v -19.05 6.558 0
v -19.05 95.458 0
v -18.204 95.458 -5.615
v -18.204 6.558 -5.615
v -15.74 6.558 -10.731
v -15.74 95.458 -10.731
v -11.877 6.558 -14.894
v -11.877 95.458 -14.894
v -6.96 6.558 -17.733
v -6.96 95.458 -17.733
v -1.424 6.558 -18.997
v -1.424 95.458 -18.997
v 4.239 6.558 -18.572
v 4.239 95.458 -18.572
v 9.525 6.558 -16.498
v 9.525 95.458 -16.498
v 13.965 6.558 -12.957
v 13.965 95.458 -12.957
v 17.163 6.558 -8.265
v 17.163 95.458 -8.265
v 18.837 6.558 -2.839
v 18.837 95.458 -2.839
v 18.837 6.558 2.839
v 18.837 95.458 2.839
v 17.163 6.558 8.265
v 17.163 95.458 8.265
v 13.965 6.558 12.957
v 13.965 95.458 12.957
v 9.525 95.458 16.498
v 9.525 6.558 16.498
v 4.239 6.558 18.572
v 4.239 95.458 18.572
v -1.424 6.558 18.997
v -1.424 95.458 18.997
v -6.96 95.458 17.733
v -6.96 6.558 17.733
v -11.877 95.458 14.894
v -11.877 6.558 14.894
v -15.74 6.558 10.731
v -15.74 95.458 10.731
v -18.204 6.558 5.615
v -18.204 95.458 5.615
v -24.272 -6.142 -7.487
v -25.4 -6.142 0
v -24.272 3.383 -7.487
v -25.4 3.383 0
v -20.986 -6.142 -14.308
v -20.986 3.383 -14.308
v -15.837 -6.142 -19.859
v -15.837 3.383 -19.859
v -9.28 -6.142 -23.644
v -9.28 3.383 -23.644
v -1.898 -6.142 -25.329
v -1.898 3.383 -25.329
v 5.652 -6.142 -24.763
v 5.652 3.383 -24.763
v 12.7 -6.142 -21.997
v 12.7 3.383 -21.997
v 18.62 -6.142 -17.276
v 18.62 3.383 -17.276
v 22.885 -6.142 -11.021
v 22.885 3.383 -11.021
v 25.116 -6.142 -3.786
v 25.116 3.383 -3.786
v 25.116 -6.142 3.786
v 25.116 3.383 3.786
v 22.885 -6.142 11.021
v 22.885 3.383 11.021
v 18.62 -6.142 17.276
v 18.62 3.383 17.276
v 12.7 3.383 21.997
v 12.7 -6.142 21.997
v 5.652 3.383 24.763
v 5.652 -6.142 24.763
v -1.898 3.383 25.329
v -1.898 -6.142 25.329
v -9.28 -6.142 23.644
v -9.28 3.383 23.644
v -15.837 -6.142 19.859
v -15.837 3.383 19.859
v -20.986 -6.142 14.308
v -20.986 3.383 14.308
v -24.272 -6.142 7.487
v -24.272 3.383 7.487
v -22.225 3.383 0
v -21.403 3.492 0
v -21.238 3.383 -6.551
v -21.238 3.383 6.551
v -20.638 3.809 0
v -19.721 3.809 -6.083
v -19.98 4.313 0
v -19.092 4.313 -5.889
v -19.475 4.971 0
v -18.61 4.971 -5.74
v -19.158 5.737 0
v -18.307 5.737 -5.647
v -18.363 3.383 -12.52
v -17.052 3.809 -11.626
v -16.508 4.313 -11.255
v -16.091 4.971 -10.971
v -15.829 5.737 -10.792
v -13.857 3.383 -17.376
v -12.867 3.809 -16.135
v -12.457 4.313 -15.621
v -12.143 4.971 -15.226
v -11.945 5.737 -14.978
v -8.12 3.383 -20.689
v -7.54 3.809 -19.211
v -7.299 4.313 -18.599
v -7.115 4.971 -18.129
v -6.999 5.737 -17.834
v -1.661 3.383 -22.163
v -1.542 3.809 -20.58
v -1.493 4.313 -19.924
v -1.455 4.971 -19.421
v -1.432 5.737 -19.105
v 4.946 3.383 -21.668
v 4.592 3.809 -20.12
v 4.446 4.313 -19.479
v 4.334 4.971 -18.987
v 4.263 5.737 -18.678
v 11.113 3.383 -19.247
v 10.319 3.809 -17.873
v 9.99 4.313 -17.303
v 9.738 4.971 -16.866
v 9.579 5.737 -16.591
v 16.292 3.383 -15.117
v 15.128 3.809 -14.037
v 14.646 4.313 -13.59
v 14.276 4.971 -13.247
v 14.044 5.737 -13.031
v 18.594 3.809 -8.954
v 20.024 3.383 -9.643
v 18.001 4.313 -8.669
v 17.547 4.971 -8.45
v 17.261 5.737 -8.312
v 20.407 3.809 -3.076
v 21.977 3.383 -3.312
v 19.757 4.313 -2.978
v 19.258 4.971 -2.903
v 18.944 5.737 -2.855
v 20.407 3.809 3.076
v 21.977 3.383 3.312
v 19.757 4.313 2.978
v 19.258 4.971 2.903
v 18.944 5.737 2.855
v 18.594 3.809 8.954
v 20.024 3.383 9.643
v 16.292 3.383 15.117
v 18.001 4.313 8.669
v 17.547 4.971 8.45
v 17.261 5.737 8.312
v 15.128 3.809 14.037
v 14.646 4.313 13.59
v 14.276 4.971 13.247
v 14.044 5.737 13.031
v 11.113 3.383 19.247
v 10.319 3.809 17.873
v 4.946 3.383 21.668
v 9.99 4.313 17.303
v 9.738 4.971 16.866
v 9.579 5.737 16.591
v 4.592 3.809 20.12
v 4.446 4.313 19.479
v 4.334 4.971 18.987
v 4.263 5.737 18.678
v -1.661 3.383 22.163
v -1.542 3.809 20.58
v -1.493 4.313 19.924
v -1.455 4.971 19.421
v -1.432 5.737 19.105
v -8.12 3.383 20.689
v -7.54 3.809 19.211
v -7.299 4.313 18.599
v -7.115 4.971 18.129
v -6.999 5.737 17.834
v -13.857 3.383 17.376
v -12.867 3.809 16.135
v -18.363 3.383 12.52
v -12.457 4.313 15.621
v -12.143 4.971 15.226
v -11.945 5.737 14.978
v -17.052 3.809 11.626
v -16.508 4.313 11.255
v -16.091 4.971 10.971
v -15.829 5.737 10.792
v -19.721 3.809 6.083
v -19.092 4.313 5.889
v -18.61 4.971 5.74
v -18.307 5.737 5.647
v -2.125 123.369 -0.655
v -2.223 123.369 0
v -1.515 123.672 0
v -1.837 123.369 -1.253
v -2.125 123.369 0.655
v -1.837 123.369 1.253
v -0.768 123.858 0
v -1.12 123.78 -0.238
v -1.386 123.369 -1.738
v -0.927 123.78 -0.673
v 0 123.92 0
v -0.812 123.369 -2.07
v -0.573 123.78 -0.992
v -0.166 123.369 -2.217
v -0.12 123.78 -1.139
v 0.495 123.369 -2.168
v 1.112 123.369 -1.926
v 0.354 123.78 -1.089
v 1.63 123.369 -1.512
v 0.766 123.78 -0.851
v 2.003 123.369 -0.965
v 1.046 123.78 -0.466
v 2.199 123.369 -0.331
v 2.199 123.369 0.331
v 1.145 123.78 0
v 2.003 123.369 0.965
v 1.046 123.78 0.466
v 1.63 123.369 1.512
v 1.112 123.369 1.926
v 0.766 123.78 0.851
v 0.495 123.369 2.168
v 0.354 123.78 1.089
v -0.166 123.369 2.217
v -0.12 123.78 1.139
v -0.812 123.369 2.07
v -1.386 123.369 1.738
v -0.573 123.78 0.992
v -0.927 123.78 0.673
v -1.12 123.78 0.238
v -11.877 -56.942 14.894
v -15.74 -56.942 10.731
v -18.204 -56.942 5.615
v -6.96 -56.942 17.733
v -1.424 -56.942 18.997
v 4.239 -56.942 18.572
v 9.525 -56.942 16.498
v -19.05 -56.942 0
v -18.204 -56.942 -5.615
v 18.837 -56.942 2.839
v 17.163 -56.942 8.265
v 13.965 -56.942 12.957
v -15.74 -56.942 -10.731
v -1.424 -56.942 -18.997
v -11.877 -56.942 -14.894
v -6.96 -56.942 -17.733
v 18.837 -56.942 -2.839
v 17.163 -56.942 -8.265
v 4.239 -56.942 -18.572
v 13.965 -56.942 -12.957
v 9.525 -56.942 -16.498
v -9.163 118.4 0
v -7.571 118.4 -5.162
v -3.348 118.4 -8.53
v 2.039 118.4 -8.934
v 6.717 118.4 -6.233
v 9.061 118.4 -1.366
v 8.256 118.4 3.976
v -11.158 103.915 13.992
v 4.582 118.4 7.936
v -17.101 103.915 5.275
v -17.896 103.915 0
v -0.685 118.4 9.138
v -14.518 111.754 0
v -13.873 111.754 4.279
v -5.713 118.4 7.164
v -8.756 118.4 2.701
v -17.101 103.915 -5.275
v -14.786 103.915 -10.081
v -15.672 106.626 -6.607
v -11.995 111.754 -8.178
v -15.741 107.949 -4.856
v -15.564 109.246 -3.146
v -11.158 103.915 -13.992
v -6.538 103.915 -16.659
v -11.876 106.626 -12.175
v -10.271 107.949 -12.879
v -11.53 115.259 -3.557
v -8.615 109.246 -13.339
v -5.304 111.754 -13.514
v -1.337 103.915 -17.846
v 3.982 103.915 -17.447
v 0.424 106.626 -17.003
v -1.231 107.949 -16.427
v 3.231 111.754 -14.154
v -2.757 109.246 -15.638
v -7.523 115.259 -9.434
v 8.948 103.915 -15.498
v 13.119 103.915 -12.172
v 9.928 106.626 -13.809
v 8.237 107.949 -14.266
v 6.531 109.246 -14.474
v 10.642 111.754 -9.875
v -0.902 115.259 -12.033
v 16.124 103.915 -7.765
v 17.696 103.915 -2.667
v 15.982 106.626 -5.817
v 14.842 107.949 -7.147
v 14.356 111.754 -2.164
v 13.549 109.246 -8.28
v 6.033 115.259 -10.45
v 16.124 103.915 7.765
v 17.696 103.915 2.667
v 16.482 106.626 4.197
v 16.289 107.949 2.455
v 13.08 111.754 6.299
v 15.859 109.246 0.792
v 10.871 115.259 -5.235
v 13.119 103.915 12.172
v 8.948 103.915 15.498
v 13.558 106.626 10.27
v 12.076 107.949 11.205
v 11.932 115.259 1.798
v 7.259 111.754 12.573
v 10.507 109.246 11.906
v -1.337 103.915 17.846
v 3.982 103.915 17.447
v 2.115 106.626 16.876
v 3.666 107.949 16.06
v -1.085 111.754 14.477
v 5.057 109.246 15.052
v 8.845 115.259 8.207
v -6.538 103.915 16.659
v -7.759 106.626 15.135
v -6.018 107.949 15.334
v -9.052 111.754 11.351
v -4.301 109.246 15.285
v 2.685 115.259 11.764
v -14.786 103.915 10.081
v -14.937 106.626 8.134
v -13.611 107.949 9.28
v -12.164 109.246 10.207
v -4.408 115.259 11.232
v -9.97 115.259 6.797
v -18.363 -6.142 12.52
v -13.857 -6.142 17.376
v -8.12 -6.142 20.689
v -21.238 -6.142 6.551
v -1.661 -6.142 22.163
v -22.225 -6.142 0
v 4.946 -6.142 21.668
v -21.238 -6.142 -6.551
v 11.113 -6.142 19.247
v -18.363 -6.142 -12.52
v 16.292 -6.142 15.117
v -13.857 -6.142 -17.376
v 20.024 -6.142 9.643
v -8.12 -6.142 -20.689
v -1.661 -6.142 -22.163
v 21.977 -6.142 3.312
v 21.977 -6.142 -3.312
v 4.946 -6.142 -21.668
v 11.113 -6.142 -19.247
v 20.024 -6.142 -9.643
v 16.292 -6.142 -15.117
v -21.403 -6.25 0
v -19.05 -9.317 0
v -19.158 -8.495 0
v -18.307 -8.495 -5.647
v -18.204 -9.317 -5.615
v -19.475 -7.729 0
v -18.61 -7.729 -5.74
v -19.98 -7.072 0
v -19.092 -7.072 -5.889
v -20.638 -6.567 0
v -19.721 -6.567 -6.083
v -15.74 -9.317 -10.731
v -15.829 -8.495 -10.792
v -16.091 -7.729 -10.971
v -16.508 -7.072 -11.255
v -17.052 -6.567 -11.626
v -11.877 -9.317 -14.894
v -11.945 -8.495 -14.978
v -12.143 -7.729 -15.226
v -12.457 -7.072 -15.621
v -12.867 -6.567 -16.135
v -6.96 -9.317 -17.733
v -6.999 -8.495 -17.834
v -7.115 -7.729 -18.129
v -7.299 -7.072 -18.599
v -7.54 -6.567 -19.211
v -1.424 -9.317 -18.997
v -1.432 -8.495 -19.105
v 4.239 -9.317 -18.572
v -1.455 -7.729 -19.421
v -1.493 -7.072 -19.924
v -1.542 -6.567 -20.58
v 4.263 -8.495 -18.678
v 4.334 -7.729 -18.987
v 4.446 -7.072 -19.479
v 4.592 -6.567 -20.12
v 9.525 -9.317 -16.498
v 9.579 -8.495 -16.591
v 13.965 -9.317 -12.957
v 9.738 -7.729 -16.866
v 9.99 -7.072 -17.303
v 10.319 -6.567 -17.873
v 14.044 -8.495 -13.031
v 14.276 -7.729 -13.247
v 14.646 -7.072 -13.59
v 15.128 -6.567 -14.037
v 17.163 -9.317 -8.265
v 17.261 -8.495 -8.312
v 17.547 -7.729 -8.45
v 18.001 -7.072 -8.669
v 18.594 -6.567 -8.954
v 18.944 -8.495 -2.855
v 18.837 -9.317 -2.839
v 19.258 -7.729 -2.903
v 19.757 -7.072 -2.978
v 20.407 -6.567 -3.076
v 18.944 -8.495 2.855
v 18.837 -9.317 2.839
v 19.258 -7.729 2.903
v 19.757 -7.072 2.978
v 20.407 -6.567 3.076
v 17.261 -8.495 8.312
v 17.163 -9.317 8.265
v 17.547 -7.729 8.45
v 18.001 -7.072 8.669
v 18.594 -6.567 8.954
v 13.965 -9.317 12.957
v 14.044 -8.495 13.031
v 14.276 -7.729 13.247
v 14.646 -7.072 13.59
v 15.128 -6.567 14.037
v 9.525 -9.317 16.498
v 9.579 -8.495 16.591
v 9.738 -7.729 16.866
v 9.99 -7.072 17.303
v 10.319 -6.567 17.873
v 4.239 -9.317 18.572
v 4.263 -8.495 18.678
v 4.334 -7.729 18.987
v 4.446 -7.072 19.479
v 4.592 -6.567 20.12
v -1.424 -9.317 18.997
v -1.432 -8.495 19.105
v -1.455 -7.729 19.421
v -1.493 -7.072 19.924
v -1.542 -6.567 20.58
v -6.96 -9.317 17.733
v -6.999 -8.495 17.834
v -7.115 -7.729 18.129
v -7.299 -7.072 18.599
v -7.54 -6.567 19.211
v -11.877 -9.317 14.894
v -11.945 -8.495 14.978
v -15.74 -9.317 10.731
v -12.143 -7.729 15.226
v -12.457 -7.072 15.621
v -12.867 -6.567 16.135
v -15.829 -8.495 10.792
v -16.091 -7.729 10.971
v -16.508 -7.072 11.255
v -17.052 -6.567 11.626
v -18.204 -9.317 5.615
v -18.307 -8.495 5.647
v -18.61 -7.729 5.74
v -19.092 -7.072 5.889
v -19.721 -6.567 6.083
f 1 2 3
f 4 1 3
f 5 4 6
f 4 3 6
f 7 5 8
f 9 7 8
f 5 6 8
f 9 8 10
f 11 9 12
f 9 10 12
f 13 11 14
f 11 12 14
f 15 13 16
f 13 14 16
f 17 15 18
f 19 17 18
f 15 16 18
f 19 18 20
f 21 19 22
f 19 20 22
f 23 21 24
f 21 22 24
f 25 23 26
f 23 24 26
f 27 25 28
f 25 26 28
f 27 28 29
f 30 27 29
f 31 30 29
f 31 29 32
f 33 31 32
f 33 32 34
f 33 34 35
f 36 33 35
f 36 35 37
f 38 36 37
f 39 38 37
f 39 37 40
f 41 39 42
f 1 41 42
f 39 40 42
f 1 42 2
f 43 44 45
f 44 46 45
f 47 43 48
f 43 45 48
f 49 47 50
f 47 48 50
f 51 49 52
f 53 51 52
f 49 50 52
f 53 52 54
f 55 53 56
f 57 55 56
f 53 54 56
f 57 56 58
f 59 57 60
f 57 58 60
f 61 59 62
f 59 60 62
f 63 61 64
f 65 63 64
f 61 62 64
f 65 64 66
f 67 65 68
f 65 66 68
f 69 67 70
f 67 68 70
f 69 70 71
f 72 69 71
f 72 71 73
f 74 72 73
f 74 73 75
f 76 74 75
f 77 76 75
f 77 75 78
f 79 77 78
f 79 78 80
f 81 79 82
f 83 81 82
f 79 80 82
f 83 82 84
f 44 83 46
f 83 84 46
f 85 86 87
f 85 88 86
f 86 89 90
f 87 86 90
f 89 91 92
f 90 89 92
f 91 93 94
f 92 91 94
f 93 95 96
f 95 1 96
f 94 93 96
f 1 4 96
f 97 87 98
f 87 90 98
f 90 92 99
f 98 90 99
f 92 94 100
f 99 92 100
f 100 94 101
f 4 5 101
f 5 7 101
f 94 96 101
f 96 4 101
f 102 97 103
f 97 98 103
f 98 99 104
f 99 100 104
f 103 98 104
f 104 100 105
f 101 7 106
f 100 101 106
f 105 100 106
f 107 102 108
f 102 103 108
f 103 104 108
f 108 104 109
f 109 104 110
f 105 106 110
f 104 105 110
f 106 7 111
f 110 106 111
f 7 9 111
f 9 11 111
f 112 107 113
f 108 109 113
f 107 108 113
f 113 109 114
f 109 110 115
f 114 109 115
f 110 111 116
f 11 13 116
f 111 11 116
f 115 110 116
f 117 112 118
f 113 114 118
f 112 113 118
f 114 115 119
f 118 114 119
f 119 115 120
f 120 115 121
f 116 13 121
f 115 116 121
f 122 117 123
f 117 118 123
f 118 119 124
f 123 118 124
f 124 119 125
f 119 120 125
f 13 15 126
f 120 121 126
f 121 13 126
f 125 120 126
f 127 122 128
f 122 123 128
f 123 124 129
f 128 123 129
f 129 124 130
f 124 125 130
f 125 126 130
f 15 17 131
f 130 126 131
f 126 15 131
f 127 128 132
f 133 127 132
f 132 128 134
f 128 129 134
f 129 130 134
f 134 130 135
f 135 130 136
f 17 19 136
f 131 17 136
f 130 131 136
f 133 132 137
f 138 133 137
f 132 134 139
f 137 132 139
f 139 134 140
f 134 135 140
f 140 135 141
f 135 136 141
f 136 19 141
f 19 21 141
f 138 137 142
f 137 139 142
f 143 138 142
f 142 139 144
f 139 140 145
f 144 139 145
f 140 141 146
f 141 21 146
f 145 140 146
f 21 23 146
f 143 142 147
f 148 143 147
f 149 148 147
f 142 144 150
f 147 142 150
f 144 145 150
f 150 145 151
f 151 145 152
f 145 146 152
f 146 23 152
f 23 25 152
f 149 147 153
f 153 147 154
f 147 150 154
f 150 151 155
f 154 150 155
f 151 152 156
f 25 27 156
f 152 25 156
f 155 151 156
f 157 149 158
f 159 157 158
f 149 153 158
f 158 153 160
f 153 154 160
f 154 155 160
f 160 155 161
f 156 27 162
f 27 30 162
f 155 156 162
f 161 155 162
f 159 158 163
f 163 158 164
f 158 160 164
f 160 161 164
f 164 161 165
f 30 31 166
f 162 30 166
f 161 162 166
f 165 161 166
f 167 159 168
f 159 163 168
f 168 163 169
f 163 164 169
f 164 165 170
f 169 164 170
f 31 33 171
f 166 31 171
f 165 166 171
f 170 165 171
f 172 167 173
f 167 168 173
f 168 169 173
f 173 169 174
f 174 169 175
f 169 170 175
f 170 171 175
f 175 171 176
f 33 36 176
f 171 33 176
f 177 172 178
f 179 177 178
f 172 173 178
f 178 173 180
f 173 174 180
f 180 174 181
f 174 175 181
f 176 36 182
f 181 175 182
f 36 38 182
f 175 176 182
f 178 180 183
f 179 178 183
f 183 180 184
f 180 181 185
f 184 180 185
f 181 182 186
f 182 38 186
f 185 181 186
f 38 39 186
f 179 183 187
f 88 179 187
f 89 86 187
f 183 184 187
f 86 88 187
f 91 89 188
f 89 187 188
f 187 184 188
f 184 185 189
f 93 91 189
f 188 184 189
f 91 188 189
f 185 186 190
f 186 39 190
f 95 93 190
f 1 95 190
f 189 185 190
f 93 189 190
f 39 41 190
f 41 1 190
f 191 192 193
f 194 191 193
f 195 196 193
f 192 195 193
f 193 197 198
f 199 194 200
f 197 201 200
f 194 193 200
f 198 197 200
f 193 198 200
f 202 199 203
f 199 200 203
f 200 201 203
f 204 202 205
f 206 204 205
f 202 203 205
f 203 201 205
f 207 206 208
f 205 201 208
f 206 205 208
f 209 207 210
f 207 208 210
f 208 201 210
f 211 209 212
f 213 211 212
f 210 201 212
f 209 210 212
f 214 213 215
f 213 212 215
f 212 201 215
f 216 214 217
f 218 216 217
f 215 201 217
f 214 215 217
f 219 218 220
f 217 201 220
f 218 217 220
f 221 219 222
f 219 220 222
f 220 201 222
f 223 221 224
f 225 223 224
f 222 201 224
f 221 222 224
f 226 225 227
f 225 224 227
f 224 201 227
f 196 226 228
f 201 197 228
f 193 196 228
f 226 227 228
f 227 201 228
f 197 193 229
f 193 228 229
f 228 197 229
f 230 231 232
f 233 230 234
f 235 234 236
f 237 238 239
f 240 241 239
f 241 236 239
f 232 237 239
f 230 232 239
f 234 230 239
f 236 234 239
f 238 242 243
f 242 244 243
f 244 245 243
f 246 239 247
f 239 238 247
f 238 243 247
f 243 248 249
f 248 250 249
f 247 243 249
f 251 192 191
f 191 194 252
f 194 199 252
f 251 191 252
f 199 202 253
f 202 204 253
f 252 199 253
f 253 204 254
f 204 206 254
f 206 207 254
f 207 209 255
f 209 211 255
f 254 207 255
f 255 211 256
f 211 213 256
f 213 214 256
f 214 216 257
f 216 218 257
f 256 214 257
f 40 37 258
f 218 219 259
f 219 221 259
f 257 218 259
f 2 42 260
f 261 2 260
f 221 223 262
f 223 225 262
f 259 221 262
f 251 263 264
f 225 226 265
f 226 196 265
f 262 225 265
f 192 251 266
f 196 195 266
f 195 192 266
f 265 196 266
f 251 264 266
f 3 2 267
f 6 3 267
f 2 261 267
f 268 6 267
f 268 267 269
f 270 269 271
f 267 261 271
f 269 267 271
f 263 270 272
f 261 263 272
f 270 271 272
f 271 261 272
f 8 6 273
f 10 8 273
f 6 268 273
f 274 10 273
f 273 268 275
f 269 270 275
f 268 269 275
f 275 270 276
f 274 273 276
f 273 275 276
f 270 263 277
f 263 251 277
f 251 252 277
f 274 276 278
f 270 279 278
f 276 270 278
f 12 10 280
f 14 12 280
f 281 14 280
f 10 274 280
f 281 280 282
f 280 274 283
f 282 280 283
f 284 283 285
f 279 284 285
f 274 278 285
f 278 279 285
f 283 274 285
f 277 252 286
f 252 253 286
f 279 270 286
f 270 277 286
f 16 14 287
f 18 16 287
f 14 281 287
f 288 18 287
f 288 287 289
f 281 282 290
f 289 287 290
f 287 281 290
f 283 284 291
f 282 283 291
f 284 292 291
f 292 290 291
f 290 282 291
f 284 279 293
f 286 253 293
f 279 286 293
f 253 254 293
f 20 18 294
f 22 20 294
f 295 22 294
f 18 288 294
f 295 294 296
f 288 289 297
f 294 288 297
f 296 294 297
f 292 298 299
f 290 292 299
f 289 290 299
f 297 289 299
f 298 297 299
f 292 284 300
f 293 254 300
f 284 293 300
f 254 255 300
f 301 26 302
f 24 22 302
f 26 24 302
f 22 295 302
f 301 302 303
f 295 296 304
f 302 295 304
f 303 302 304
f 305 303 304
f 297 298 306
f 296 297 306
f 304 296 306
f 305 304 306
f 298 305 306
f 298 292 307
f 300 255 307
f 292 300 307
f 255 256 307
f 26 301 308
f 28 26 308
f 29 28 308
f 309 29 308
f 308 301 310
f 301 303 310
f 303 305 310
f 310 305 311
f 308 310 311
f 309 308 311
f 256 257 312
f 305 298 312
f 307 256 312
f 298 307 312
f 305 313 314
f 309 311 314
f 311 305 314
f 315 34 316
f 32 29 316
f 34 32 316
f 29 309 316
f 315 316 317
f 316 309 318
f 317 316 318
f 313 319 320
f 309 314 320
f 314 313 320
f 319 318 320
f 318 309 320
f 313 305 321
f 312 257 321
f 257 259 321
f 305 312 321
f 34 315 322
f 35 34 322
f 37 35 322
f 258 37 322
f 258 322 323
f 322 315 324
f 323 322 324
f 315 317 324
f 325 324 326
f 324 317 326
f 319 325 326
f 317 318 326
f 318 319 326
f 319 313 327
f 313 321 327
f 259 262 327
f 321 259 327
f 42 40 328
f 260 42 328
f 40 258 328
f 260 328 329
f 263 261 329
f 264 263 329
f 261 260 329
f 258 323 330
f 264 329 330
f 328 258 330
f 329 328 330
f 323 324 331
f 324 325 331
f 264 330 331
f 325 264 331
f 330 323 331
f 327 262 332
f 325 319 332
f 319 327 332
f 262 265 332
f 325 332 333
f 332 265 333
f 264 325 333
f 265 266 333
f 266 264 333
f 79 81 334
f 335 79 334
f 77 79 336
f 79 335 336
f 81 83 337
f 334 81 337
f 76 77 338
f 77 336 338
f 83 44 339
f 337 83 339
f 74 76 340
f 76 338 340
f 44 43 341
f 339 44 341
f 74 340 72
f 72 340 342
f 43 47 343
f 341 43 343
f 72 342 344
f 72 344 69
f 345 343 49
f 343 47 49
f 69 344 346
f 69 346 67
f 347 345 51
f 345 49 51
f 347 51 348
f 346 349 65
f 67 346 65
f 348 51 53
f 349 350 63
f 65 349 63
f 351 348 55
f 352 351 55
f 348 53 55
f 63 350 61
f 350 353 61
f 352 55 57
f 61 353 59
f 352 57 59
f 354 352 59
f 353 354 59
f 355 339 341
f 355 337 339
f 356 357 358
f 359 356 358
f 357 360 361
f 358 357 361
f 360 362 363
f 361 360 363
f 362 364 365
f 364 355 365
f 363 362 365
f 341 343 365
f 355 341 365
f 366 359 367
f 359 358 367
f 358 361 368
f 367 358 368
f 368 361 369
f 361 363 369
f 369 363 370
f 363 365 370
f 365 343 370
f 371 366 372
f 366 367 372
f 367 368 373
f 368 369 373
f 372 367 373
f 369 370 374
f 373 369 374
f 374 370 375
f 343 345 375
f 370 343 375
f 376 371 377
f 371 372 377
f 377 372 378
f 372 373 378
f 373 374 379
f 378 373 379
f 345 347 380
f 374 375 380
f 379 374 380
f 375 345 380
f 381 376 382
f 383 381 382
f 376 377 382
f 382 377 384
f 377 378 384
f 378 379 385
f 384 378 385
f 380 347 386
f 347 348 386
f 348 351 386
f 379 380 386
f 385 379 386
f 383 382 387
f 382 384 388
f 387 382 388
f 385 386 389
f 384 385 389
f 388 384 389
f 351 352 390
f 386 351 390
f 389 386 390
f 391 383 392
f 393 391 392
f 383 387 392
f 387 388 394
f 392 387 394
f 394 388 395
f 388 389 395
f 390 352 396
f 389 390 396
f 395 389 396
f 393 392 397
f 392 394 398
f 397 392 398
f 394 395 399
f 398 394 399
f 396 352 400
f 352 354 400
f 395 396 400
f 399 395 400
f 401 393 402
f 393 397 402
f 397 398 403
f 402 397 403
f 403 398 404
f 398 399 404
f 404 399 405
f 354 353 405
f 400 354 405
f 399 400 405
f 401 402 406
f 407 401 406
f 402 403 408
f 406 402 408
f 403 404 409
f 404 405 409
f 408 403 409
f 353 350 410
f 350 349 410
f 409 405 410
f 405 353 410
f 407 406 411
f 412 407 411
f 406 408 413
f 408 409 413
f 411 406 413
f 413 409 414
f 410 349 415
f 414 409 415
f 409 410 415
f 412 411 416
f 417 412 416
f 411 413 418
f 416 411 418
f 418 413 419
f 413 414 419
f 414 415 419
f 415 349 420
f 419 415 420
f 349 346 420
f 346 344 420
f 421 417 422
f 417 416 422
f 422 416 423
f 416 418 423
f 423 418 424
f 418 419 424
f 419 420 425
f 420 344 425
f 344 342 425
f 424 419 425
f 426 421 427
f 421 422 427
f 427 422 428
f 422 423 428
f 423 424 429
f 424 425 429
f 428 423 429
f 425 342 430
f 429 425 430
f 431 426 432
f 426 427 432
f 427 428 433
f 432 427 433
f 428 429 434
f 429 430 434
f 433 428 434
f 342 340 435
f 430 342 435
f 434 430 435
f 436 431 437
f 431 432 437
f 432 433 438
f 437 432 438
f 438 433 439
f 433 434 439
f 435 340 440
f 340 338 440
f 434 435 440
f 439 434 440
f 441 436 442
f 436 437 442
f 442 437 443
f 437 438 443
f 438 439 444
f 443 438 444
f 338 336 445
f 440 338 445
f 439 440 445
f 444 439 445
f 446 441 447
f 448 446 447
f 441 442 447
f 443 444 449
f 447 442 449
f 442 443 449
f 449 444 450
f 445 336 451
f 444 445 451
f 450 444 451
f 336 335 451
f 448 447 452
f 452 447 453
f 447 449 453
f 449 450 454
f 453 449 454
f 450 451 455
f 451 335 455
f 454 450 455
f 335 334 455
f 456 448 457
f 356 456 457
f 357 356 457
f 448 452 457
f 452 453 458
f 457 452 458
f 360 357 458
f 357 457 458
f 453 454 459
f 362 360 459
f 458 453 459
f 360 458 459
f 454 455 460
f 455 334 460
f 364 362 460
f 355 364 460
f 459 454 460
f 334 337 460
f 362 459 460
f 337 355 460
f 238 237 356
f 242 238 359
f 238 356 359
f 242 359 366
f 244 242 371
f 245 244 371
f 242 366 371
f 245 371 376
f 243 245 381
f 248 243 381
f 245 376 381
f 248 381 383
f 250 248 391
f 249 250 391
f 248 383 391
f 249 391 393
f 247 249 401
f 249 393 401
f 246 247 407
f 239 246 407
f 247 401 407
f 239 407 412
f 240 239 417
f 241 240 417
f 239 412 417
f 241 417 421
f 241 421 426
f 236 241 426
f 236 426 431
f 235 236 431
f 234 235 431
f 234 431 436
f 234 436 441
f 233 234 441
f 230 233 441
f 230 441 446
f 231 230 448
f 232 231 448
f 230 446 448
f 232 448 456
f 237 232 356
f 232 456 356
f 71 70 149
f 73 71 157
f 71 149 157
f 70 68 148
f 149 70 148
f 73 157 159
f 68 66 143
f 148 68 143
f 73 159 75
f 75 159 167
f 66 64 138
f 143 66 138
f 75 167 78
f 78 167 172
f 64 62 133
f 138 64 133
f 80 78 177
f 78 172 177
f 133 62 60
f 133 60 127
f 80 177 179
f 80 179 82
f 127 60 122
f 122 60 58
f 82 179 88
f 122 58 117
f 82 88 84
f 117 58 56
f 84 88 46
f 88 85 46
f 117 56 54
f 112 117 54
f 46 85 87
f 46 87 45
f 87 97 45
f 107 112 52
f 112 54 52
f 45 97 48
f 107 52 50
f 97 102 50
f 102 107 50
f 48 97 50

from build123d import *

# Parameters (mm, degrees)
FILLET1_R = 3.175


with BuildPart() as part:
    # Sketch1 → Revolve2 (revolve)
    with BuildSketch(Plane.XY):
        with BuildLine():
            Line((-25.4, -6.141632853), (-25.4, 3.383367147))
            Line((-25.4, 3.383367147), (-19.05, 3.383367147))
            Line((-19.05, 3.383367147), (-19.05, 95.458367147))
            ThreePointArc((-19.05, 95.458367147), (-14.517976471, 111.753635849), (-2.223442899, 123.369119633))
            ThreePointArc((-2.223442899, 123.369119633), (-1.145335288, 123.78023171), (0, 123.9200038))
            Line((0, 123.9200038), (0, 95.458367147))
            Line((0, 95.458367147), (0, 0))
            Line((0, 0), (0, -56.941632853))
            Line((0, -56.941632853), (-19.05, -56.941632853))
            Line((-19.05, -56.941632853), (-19.05, -6.141632853))
            Line((-19.05, -6.141632853), (-25.4, -6.141632853))
        make_face()
    revolve(axis=Axis((0, 95.458367147, 0), (0, -1, 0)))

    # Fillet1
    fillet1_edges = [part.edges().sort_by_distance(p)[0] for p in [
        (19.05, 3.383367147, 0),
        (19.05, -6.141632853, 0),
    ]]
    fillet(fillet1_edges, radius=FILLET1_R)


solid = part.part
